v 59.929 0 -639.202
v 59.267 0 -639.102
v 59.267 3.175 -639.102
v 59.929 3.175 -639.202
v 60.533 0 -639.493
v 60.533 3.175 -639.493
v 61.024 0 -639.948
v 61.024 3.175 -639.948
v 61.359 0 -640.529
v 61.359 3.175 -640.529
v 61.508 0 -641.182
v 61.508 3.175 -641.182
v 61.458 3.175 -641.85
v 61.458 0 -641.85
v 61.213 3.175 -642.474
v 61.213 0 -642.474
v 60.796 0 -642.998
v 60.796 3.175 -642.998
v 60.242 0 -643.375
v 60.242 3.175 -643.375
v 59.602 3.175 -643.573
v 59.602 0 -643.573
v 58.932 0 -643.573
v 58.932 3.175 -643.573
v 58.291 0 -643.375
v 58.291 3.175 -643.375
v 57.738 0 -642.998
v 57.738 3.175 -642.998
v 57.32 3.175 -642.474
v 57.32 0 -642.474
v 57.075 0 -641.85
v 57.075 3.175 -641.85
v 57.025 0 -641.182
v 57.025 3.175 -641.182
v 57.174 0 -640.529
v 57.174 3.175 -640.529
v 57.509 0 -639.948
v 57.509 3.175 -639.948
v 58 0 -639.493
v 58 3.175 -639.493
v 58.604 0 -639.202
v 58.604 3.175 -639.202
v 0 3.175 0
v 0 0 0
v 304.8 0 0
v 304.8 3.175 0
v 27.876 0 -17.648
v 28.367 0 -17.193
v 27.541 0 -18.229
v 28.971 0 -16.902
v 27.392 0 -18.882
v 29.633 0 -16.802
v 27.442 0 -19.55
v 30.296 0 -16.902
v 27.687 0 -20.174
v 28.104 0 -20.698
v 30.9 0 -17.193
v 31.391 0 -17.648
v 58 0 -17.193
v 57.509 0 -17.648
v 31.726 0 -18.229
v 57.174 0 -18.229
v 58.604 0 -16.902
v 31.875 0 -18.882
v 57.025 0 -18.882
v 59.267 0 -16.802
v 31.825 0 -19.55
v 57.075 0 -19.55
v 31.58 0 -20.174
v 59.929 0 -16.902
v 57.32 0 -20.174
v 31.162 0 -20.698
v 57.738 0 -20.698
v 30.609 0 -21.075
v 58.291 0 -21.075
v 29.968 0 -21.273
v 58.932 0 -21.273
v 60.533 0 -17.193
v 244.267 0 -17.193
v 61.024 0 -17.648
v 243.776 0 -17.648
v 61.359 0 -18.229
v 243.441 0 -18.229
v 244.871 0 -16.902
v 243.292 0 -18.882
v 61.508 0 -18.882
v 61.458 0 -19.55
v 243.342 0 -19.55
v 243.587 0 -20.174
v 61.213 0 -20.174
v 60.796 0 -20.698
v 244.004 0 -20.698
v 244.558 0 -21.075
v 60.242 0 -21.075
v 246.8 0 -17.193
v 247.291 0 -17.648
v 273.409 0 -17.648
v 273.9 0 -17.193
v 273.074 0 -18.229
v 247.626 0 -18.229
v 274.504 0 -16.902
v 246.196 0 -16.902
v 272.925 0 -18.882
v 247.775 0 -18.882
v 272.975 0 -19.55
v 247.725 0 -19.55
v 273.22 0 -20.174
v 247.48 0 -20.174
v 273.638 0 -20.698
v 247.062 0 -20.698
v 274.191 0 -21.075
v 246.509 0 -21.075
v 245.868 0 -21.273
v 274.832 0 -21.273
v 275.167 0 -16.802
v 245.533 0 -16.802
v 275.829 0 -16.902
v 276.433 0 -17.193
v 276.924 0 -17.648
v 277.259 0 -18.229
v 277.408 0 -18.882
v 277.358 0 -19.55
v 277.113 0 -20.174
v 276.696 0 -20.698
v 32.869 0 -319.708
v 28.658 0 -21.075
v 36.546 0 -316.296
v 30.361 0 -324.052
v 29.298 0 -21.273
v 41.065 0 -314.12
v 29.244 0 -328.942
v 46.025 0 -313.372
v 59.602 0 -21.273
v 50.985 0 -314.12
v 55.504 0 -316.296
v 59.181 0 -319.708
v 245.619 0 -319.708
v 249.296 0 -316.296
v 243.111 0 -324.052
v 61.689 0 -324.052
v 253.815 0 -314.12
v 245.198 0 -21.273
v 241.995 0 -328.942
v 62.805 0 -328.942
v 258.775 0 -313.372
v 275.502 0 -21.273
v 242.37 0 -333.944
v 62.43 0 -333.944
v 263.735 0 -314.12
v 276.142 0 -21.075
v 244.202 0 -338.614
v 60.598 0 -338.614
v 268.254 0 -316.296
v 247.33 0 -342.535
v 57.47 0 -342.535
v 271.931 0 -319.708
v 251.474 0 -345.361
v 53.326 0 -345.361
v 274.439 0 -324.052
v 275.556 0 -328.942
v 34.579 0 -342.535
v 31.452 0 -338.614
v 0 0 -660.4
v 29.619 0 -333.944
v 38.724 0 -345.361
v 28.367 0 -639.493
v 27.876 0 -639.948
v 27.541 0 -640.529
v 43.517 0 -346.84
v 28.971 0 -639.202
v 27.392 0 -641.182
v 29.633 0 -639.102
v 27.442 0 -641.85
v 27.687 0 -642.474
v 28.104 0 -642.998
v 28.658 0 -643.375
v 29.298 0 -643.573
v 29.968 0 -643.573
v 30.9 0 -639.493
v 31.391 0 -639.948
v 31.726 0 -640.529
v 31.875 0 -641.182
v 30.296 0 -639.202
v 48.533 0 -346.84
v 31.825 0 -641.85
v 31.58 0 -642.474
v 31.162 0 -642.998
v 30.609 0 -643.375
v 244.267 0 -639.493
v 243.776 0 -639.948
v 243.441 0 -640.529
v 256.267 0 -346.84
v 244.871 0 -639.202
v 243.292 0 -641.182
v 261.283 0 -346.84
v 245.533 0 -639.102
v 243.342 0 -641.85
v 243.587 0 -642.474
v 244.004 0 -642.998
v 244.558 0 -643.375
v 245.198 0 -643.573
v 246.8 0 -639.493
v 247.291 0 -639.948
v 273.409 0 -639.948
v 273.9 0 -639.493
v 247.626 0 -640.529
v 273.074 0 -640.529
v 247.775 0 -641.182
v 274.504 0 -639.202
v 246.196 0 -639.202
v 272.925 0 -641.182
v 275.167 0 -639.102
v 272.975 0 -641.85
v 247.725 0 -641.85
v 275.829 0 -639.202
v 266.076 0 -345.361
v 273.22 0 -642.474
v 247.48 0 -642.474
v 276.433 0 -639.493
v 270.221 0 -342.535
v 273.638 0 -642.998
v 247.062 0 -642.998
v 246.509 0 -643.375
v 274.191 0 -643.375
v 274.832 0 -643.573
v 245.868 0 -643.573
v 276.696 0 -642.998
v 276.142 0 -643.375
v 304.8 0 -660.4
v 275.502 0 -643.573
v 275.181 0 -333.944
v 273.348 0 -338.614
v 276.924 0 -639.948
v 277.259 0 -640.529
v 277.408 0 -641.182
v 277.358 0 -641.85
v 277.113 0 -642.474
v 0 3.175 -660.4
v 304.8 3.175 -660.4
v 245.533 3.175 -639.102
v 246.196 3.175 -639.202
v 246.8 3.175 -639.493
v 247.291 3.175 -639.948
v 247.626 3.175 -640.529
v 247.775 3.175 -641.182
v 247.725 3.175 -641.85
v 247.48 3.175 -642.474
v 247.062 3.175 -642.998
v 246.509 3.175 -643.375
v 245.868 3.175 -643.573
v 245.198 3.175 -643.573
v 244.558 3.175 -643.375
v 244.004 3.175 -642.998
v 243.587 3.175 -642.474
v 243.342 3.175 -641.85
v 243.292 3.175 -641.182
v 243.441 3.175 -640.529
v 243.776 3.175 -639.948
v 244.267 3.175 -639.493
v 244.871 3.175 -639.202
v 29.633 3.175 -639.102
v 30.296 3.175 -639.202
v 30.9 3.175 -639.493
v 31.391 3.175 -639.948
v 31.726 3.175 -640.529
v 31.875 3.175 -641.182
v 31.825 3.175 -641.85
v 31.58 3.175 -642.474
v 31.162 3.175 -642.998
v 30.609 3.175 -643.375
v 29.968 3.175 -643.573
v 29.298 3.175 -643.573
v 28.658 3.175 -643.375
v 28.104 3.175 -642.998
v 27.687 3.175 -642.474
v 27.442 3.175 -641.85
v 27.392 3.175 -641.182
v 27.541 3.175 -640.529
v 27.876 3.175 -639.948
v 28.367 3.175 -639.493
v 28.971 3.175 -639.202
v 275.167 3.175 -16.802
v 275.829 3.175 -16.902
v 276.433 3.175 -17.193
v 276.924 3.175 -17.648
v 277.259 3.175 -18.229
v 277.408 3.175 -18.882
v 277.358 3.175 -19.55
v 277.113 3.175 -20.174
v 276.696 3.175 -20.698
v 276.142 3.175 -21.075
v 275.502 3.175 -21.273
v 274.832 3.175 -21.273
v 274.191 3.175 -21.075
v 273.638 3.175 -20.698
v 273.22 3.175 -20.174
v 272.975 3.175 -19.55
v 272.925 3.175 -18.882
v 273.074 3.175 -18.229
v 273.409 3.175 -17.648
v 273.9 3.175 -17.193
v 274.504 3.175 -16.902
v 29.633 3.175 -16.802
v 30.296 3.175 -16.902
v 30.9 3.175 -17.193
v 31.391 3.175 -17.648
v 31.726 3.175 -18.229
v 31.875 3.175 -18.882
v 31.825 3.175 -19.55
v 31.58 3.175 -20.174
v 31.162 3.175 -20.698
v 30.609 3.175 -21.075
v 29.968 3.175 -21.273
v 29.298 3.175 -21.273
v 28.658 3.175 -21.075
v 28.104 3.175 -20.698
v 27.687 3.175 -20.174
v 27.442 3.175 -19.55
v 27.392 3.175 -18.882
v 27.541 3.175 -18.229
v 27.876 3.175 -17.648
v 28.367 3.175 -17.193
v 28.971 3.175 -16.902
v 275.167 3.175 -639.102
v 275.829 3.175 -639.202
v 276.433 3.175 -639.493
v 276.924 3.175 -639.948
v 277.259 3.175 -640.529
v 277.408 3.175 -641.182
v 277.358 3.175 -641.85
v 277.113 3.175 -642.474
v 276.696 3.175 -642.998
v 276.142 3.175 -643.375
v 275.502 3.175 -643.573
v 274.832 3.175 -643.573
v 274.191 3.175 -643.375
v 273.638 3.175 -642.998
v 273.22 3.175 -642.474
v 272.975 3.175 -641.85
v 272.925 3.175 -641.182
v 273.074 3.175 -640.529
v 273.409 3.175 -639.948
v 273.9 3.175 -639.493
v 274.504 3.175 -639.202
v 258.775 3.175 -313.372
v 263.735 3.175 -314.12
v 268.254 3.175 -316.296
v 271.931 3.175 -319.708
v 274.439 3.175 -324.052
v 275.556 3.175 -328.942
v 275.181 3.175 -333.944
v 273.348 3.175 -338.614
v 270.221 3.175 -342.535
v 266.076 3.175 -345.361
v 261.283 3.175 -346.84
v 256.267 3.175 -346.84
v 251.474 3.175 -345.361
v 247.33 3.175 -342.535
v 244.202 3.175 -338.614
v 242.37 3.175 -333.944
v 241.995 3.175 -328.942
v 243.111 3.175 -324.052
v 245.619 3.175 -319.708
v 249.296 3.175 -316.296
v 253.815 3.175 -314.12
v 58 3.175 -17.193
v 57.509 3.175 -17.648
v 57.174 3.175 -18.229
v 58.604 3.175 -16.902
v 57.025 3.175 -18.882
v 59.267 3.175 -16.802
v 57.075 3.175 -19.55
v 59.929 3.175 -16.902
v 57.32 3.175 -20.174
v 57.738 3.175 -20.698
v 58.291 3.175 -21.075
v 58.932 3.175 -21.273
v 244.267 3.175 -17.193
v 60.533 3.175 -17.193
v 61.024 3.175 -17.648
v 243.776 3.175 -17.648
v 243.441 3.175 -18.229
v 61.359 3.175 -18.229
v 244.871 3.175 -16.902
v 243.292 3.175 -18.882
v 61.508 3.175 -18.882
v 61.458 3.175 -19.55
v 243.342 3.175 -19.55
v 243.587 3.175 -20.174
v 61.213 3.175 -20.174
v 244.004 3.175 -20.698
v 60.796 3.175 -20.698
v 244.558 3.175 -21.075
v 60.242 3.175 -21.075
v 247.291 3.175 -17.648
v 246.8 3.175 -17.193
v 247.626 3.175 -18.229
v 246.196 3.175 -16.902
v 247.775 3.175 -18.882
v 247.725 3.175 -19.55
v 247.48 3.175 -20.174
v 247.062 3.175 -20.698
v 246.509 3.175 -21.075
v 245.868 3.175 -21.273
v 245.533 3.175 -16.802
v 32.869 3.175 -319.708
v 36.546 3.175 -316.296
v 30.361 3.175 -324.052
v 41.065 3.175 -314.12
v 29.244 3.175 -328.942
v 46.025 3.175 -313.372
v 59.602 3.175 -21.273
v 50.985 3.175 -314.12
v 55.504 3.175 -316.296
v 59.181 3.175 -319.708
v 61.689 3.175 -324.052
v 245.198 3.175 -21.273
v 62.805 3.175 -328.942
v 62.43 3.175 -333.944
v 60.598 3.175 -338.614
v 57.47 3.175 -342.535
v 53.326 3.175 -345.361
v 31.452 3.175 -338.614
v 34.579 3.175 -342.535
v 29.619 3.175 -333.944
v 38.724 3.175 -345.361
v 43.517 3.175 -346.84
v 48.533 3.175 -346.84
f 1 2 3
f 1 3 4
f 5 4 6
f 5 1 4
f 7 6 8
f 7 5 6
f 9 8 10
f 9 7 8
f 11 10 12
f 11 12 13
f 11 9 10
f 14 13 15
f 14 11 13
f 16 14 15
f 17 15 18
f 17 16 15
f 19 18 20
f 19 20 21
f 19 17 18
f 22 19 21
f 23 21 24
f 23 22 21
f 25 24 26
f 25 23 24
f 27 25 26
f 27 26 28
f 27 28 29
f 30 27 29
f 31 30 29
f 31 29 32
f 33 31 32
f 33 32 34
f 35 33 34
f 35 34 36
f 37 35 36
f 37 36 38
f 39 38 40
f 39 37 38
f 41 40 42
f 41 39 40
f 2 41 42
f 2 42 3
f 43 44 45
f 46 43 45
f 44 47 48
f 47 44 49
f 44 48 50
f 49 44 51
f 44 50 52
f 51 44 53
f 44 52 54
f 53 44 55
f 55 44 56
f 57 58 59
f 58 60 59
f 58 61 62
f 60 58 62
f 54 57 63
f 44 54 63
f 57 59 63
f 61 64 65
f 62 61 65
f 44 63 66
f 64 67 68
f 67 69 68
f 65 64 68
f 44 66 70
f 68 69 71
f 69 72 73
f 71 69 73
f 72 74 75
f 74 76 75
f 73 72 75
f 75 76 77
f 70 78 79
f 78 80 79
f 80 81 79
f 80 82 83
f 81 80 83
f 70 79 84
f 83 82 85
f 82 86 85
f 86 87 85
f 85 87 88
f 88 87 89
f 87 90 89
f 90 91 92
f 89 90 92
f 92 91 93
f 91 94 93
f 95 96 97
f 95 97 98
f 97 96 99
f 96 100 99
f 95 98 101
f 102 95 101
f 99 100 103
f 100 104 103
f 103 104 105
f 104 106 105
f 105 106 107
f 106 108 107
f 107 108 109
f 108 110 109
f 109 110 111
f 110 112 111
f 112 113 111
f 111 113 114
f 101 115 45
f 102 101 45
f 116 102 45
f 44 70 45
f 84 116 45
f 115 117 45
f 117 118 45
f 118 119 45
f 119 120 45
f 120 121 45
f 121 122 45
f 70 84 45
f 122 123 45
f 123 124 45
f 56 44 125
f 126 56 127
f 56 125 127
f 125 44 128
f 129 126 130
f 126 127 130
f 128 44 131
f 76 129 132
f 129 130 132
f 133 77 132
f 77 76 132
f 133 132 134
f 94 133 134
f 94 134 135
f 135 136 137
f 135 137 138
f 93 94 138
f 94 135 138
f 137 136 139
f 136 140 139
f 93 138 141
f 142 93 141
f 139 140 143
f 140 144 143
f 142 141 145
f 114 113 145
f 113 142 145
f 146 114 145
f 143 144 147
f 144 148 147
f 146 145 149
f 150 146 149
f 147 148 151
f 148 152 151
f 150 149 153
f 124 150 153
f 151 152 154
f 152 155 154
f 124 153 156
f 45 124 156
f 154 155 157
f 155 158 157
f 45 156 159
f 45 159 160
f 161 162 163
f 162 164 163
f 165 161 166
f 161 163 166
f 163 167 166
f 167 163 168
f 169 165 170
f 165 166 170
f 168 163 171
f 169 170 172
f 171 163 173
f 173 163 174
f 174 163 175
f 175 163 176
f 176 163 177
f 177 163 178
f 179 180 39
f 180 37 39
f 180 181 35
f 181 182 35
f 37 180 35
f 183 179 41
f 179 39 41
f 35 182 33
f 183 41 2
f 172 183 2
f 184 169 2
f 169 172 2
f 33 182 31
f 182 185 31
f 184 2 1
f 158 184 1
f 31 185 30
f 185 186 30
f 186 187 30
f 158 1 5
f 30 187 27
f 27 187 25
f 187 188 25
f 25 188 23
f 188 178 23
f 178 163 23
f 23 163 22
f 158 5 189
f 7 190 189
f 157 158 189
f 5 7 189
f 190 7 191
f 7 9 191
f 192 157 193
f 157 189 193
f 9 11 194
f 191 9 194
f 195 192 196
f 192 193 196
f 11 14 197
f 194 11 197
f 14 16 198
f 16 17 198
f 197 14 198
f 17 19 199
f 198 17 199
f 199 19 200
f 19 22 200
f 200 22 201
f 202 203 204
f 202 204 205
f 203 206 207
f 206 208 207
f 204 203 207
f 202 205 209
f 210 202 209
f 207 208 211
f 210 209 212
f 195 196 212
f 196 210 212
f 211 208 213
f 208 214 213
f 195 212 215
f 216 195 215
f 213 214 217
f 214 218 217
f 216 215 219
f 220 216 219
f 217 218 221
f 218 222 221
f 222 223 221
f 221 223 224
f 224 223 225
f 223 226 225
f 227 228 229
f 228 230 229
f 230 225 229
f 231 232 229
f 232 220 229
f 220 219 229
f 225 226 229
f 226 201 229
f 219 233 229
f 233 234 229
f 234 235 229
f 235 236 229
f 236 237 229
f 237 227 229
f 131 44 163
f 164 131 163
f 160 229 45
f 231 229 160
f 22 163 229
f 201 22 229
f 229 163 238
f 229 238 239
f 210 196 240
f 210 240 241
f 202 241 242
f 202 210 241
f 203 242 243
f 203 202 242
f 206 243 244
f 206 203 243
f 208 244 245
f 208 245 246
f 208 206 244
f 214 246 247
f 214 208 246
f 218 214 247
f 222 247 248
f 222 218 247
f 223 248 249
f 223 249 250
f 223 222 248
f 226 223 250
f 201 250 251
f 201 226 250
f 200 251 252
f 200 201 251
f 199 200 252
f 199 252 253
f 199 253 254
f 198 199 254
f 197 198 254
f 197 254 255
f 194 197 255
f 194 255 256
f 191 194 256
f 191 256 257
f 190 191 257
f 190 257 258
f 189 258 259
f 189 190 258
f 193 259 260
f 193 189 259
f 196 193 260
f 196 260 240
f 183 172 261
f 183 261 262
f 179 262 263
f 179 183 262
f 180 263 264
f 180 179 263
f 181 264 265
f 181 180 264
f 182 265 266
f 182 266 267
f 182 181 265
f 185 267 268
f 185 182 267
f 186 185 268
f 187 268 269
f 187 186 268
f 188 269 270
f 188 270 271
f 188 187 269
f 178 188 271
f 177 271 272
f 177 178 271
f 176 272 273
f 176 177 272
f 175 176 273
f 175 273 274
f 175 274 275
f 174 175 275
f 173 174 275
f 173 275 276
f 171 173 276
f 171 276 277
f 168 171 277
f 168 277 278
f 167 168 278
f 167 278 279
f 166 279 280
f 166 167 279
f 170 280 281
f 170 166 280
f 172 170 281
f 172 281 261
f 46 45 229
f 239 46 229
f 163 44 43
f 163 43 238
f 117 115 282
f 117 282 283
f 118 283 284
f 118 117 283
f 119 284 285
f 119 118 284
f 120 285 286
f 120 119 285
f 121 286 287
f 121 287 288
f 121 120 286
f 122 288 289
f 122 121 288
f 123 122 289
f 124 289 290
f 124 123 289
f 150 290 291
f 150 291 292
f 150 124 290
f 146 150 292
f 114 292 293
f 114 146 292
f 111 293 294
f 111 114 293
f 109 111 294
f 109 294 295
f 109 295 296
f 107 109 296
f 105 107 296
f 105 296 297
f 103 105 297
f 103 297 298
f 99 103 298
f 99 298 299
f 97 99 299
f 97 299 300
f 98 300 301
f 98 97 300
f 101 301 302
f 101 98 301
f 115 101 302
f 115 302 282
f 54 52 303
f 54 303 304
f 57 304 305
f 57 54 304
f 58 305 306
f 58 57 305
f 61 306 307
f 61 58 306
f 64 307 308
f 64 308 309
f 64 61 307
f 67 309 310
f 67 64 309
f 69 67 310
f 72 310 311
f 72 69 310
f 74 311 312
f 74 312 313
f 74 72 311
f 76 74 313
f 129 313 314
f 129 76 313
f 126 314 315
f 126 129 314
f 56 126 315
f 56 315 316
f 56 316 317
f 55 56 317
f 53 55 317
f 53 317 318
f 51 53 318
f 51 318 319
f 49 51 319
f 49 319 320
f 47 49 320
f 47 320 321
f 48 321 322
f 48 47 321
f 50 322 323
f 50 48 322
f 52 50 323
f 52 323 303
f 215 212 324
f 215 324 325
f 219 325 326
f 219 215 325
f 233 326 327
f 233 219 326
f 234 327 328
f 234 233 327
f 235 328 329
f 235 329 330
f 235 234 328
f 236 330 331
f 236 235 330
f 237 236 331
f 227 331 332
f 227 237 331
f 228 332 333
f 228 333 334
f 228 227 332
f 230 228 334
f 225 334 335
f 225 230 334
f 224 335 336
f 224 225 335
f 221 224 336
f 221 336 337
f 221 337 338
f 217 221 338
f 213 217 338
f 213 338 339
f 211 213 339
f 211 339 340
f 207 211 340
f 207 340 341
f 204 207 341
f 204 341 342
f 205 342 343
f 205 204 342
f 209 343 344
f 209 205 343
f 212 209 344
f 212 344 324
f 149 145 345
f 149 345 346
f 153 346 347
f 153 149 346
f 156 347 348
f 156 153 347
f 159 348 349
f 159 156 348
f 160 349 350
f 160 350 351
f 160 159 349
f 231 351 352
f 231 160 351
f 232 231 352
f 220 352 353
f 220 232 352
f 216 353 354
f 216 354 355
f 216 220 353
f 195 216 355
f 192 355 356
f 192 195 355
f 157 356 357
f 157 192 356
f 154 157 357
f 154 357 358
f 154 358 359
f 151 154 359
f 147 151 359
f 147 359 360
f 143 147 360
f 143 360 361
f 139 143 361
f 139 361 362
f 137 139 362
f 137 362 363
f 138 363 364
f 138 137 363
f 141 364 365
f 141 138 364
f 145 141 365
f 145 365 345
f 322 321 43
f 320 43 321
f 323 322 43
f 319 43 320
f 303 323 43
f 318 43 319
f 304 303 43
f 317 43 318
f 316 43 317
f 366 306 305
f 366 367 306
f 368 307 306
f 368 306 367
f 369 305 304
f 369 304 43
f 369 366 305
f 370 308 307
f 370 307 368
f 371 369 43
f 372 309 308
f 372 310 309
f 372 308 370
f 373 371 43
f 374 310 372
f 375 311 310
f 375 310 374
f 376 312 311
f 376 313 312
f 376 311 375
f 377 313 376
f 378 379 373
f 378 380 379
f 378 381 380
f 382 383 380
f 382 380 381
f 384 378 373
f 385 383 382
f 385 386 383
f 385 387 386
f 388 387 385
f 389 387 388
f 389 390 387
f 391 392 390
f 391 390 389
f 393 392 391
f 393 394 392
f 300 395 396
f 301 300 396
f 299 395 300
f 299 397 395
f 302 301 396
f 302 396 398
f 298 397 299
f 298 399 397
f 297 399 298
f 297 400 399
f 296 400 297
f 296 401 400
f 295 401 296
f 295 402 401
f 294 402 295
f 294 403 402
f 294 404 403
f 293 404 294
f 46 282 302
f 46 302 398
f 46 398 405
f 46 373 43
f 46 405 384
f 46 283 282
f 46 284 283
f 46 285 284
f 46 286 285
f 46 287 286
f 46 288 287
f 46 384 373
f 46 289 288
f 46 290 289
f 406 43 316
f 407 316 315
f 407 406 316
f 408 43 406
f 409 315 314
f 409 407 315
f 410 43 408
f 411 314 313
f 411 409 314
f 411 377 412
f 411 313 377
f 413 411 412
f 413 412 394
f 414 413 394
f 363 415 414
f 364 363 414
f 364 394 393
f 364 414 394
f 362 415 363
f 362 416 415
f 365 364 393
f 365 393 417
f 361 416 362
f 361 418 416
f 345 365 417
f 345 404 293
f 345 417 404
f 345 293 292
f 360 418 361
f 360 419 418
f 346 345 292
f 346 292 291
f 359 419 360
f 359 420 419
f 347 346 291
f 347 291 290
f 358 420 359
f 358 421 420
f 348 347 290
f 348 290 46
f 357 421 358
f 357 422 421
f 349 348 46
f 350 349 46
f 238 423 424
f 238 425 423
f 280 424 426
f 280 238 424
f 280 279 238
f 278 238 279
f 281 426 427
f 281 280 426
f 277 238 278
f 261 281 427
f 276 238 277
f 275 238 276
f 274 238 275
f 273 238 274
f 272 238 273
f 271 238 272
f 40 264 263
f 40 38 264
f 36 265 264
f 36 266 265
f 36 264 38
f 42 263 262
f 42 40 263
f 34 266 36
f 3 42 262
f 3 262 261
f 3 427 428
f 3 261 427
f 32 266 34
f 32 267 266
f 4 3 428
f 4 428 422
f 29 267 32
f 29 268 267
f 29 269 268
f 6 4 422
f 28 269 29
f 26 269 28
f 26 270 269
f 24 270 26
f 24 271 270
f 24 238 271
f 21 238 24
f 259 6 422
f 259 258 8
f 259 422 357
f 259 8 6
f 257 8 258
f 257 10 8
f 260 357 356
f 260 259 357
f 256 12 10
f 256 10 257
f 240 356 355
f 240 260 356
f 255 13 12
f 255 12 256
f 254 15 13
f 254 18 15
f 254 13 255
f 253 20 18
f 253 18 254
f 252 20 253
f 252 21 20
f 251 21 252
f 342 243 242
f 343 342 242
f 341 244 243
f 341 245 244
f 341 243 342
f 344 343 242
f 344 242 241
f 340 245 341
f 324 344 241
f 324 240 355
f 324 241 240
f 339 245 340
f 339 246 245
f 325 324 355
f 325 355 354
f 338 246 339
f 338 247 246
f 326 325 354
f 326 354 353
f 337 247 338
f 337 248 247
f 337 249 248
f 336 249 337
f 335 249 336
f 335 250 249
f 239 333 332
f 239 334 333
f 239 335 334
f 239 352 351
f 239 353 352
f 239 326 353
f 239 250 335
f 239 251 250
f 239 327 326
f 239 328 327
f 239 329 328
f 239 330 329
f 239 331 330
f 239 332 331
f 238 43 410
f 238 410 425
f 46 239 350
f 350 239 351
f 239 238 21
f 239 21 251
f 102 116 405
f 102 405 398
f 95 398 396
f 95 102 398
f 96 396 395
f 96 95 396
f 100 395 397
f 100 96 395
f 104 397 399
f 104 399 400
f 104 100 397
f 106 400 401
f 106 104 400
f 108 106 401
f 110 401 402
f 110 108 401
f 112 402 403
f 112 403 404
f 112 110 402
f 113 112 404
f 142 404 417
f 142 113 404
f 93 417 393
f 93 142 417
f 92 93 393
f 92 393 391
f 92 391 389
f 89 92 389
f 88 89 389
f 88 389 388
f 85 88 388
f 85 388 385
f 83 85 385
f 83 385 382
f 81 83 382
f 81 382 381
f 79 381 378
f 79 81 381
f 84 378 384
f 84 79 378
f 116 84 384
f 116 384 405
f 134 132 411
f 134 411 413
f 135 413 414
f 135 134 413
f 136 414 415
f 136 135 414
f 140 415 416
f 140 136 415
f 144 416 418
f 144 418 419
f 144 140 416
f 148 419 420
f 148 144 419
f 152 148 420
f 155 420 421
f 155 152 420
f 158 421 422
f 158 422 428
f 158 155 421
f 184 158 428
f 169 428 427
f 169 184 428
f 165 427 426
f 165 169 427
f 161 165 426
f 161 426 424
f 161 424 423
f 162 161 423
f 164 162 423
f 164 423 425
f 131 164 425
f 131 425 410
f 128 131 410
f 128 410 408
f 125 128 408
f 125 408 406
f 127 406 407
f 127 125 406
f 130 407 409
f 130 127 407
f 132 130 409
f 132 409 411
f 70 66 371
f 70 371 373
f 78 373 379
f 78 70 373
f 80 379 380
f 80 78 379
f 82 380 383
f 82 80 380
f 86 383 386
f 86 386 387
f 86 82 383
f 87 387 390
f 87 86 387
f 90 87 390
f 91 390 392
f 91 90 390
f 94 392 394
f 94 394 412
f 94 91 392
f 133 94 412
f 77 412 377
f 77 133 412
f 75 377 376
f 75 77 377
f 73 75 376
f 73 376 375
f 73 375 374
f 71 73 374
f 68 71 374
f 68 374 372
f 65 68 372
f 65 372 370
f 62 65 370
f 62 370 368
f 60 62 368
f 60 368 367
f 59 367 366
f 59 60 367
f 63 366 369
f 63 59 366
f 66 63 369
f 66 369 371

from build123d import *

# Parameters (mm, degrees)
SKETCH1_W           = 304.8
SKETCH1_H           = 660.4
SKETCH1_R           = 16.8275
SKETCH1_R_2         = 2.2479
BOSS_EXTRUDE1_DEPTH = 3.175


with BuildPart() as part:
    # Sketch1 → Boss-Extrude1 (new body)
    with BuildSketch(Plane(origin=(0, 0, 0), x_dir=(1, 0, 0), z_dir=(0, 1, 0))):
        with Locations((152.4, 330.2)):
            Rectangle(SKETCH1_W, SKETCH1_H)
        with Locations(Location((46.0248, 330.2, 0), (0, 0, 270))):
            Circle(SKETCH1_R, mode=Mode.SUBTRACT)
        with Locations(Location((258.7752, 330.2, 0), (0, 0, 270))):
            Circle(SKETCH1_R, mode=Mode.SUBTRACT)
        with Locations(Location((29.633333333, 19.05, 0), (0, 0, 270))):
            Circle(SKETCH1_R_2, mode=Mode.SUBTRACT)
        with Locations(Location((59.266666667, 19.05, 0), (0, 0, 270))):
            Circle(SKETCH1_R_2, mode=Mode.SUBTRACT)
        with Locations(Location((245.533333333, 19.05, 0), (0, 0, 270))):
            Circle(SKETCH1_R_2, mode=Mode.SUBTRACT)
        with Locations(Location((275.166666667, 19.05, 0), (0, 0, 270))):
            Circle(SKETCH1_R_2, mode=Mode.SUBTRACT)
        with Locations(Location((275.166666667, 641.35, 0), (0, 0, 270))):
            Circle(SKETCH1_R_2, mode=Mode.SUBTRACT)
        with Locations(Location((245.533333333, 641.35, 0), (0, 0, 270))):
            Circle(SKETCH1_R_2, mode=Mode.SUBTRACT)
        with Locations(Location((59.266666667, 641.35, 0), (0, 0, 270))):
            Circle(SKETCH1_R_2, mode=Mode.SUBTRACT)
        with Locations(Location((29.633333333, 641.35, 0), (0, 0, 270))):
            Circle(SKETCH1_R_2, mode=Mode.SUBTRACT)
    extrude(amount=BOSS_EXTRUDE1_DEPTH)


solid = part.part
